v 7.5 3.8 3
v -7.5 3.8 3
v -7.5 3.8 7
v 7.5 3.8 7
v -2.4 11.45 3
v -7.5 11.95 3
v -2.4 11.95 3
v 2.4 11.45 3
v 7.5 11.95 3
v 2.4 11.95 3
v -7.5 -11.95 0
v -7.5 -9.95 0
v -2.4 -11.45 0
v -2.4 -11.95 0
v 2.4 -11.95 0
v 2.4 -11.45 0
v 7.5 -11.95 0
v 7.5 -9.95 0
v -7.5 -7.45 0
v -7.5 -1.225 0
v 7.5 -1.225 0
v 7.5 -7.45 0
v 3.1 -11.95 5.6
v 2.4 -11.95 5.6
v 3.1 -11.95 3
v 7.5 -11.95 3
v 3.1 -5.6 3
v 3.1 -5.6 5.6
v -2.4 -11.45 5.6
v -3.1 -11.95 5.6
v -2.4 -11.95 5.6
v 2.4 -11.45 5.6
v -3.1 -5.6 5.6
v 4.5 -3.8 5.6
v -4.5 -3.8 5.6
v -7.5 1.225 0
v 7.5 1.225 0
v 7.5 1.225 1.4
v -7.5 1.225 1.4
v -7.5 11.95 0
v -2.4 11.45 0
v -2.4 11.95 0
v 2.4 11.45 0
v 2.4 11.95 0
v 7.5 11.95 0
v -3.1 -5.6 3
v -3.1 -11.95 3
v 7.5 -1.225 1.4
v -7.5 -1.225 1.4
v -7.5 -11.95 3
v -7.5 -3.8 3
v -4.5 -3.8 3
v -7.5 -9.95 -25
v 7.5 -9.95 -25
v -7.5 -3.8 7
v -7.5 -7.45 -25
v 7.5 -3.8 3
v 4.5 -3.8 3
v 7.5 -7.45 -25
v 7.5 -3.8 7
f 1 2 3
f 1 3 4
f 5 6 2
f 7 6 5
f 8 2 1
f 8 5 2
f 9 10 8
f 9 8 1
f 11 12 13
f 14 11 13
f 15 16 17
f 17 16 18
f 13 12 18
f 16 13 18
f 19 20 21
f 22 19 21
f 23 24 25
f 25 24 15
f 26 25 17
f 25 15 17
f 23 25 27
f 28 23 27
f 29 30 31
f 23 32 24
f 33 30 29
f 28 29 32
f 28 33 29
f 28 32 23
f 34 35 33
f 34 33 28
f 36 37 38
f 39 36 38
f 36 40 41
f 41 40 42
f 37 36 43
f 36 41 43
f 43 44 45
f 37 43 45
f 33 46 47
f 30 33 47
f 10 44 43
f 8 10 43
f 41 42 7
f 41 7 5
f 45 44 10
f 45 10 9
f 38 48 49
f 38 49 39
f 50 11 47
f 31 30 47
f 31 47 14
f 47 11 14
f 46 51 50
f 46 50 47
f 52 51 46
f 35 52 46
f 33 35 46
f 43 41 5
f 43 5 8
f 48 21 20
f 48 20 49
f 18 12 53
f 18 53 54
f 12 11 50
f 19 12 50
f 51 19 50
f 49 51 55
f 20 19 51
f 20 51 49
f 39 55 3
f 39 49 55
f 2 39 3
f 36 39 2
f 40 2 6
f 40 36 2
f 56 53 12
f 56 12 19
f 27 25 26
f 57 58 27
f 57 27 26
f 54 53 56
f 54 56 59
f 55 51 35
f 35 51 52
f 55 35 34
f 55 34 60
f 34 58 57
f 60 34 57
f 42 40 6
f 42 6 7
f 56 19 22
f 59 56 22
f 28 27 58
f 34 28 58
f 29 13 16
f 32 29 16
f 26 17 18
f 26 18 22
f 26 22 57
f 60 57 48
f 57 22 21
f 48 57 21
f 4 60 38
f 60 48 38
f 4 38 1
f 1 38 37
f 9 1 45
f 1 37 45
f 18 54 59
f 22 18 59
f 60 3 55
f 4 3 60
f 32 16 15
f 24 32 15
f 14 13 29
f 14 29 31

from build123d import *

# Parameters (mm, degrees)
SKETCH_W        = 15
SKETCH_H        = 23.9
PAD_DEPTH       = 3
SKETCH001_W     = 15
SKETCH001_H     = 7.6
PAD001_DEPTH    = 4
PAD002_DEPTH    = 2.6
SKETCH003_W     = 4.8
SKETCH003_H     = 0.5
POCKET_DEPTH    = 20
SKETCH004_W     = 2.45
SKETCH004_H     = 1.4
POCKET001_DEPTH = 20
SKETCH005_W     = 15
SKETCH005_H     = 2.5
PAD003_DEPTH    = 25


with BuildPart() as part:
    # Sketch → Pad (new body)
    with BuildSketch(Plane.XY):
        Rectangle(SKETCH_W, SKETCH_H)
    extrude(amount=PAD_DEPTH)

    # Sketch001 → Pad001 (new body)
    with BuildSketch(Plane.XY.offset(3)):
        Rectangle(SKETCH001_W, SKETCH001_H)
    extrude(amount=PAD001_DEPTH)

    # Sketch002 → Pad002 (new body)
    with BuildSketch(Plane.XY.offset(3)):
        Polygon((-3.1, -11.95), (3.1, -11.95), (3.1, -5.6), (4.5, -3.8), (-4.5, -3.8), (-3.1, -5.6), align=None)
    extrude(amount=PAD002_DEPTH)

    # Sketch003 → Pocket (cut)
    with BuildSketch(Plane(origin=(0, 0, 0), x_dir=(1, 0, 0), z_dir=(0, 0, -1))):
        with Locations((0, 11.7)):
            Rectangle(SKETCH003_W, SKETCH003_H)
        with Locations((0, -11.7)):
            Rectangle(SKETCH003_W, SKETCH003_H)
    extrude(amount=-POCKET_DEPTH, mode=Mode.SUBTRACT)

    # Sketch004 → Pocket001 (cut)
    with BuildSketch(Plane.YZ.offset(7.5)):
        with Locations((0, 0.7)):
            Rectangle(SKETCH004_W, SKETCH004_H)
    extrude(amount=-POCKET001_DEPTH, mode=Mode.SUBTRACT)

    # Sketch005 → Pad003 (new body)
    with BuildSketch(Plane(origin=(0, 0, 0), x_dir=(1, 0, 0), z_dir=(0, 0, -1))):
        with Locations((0, 8.7)):
            Rectangle(SKETCH005_W, SKETCH005_H)
    extrude(amount=PAD003_DEPTH)


solid = part.part
